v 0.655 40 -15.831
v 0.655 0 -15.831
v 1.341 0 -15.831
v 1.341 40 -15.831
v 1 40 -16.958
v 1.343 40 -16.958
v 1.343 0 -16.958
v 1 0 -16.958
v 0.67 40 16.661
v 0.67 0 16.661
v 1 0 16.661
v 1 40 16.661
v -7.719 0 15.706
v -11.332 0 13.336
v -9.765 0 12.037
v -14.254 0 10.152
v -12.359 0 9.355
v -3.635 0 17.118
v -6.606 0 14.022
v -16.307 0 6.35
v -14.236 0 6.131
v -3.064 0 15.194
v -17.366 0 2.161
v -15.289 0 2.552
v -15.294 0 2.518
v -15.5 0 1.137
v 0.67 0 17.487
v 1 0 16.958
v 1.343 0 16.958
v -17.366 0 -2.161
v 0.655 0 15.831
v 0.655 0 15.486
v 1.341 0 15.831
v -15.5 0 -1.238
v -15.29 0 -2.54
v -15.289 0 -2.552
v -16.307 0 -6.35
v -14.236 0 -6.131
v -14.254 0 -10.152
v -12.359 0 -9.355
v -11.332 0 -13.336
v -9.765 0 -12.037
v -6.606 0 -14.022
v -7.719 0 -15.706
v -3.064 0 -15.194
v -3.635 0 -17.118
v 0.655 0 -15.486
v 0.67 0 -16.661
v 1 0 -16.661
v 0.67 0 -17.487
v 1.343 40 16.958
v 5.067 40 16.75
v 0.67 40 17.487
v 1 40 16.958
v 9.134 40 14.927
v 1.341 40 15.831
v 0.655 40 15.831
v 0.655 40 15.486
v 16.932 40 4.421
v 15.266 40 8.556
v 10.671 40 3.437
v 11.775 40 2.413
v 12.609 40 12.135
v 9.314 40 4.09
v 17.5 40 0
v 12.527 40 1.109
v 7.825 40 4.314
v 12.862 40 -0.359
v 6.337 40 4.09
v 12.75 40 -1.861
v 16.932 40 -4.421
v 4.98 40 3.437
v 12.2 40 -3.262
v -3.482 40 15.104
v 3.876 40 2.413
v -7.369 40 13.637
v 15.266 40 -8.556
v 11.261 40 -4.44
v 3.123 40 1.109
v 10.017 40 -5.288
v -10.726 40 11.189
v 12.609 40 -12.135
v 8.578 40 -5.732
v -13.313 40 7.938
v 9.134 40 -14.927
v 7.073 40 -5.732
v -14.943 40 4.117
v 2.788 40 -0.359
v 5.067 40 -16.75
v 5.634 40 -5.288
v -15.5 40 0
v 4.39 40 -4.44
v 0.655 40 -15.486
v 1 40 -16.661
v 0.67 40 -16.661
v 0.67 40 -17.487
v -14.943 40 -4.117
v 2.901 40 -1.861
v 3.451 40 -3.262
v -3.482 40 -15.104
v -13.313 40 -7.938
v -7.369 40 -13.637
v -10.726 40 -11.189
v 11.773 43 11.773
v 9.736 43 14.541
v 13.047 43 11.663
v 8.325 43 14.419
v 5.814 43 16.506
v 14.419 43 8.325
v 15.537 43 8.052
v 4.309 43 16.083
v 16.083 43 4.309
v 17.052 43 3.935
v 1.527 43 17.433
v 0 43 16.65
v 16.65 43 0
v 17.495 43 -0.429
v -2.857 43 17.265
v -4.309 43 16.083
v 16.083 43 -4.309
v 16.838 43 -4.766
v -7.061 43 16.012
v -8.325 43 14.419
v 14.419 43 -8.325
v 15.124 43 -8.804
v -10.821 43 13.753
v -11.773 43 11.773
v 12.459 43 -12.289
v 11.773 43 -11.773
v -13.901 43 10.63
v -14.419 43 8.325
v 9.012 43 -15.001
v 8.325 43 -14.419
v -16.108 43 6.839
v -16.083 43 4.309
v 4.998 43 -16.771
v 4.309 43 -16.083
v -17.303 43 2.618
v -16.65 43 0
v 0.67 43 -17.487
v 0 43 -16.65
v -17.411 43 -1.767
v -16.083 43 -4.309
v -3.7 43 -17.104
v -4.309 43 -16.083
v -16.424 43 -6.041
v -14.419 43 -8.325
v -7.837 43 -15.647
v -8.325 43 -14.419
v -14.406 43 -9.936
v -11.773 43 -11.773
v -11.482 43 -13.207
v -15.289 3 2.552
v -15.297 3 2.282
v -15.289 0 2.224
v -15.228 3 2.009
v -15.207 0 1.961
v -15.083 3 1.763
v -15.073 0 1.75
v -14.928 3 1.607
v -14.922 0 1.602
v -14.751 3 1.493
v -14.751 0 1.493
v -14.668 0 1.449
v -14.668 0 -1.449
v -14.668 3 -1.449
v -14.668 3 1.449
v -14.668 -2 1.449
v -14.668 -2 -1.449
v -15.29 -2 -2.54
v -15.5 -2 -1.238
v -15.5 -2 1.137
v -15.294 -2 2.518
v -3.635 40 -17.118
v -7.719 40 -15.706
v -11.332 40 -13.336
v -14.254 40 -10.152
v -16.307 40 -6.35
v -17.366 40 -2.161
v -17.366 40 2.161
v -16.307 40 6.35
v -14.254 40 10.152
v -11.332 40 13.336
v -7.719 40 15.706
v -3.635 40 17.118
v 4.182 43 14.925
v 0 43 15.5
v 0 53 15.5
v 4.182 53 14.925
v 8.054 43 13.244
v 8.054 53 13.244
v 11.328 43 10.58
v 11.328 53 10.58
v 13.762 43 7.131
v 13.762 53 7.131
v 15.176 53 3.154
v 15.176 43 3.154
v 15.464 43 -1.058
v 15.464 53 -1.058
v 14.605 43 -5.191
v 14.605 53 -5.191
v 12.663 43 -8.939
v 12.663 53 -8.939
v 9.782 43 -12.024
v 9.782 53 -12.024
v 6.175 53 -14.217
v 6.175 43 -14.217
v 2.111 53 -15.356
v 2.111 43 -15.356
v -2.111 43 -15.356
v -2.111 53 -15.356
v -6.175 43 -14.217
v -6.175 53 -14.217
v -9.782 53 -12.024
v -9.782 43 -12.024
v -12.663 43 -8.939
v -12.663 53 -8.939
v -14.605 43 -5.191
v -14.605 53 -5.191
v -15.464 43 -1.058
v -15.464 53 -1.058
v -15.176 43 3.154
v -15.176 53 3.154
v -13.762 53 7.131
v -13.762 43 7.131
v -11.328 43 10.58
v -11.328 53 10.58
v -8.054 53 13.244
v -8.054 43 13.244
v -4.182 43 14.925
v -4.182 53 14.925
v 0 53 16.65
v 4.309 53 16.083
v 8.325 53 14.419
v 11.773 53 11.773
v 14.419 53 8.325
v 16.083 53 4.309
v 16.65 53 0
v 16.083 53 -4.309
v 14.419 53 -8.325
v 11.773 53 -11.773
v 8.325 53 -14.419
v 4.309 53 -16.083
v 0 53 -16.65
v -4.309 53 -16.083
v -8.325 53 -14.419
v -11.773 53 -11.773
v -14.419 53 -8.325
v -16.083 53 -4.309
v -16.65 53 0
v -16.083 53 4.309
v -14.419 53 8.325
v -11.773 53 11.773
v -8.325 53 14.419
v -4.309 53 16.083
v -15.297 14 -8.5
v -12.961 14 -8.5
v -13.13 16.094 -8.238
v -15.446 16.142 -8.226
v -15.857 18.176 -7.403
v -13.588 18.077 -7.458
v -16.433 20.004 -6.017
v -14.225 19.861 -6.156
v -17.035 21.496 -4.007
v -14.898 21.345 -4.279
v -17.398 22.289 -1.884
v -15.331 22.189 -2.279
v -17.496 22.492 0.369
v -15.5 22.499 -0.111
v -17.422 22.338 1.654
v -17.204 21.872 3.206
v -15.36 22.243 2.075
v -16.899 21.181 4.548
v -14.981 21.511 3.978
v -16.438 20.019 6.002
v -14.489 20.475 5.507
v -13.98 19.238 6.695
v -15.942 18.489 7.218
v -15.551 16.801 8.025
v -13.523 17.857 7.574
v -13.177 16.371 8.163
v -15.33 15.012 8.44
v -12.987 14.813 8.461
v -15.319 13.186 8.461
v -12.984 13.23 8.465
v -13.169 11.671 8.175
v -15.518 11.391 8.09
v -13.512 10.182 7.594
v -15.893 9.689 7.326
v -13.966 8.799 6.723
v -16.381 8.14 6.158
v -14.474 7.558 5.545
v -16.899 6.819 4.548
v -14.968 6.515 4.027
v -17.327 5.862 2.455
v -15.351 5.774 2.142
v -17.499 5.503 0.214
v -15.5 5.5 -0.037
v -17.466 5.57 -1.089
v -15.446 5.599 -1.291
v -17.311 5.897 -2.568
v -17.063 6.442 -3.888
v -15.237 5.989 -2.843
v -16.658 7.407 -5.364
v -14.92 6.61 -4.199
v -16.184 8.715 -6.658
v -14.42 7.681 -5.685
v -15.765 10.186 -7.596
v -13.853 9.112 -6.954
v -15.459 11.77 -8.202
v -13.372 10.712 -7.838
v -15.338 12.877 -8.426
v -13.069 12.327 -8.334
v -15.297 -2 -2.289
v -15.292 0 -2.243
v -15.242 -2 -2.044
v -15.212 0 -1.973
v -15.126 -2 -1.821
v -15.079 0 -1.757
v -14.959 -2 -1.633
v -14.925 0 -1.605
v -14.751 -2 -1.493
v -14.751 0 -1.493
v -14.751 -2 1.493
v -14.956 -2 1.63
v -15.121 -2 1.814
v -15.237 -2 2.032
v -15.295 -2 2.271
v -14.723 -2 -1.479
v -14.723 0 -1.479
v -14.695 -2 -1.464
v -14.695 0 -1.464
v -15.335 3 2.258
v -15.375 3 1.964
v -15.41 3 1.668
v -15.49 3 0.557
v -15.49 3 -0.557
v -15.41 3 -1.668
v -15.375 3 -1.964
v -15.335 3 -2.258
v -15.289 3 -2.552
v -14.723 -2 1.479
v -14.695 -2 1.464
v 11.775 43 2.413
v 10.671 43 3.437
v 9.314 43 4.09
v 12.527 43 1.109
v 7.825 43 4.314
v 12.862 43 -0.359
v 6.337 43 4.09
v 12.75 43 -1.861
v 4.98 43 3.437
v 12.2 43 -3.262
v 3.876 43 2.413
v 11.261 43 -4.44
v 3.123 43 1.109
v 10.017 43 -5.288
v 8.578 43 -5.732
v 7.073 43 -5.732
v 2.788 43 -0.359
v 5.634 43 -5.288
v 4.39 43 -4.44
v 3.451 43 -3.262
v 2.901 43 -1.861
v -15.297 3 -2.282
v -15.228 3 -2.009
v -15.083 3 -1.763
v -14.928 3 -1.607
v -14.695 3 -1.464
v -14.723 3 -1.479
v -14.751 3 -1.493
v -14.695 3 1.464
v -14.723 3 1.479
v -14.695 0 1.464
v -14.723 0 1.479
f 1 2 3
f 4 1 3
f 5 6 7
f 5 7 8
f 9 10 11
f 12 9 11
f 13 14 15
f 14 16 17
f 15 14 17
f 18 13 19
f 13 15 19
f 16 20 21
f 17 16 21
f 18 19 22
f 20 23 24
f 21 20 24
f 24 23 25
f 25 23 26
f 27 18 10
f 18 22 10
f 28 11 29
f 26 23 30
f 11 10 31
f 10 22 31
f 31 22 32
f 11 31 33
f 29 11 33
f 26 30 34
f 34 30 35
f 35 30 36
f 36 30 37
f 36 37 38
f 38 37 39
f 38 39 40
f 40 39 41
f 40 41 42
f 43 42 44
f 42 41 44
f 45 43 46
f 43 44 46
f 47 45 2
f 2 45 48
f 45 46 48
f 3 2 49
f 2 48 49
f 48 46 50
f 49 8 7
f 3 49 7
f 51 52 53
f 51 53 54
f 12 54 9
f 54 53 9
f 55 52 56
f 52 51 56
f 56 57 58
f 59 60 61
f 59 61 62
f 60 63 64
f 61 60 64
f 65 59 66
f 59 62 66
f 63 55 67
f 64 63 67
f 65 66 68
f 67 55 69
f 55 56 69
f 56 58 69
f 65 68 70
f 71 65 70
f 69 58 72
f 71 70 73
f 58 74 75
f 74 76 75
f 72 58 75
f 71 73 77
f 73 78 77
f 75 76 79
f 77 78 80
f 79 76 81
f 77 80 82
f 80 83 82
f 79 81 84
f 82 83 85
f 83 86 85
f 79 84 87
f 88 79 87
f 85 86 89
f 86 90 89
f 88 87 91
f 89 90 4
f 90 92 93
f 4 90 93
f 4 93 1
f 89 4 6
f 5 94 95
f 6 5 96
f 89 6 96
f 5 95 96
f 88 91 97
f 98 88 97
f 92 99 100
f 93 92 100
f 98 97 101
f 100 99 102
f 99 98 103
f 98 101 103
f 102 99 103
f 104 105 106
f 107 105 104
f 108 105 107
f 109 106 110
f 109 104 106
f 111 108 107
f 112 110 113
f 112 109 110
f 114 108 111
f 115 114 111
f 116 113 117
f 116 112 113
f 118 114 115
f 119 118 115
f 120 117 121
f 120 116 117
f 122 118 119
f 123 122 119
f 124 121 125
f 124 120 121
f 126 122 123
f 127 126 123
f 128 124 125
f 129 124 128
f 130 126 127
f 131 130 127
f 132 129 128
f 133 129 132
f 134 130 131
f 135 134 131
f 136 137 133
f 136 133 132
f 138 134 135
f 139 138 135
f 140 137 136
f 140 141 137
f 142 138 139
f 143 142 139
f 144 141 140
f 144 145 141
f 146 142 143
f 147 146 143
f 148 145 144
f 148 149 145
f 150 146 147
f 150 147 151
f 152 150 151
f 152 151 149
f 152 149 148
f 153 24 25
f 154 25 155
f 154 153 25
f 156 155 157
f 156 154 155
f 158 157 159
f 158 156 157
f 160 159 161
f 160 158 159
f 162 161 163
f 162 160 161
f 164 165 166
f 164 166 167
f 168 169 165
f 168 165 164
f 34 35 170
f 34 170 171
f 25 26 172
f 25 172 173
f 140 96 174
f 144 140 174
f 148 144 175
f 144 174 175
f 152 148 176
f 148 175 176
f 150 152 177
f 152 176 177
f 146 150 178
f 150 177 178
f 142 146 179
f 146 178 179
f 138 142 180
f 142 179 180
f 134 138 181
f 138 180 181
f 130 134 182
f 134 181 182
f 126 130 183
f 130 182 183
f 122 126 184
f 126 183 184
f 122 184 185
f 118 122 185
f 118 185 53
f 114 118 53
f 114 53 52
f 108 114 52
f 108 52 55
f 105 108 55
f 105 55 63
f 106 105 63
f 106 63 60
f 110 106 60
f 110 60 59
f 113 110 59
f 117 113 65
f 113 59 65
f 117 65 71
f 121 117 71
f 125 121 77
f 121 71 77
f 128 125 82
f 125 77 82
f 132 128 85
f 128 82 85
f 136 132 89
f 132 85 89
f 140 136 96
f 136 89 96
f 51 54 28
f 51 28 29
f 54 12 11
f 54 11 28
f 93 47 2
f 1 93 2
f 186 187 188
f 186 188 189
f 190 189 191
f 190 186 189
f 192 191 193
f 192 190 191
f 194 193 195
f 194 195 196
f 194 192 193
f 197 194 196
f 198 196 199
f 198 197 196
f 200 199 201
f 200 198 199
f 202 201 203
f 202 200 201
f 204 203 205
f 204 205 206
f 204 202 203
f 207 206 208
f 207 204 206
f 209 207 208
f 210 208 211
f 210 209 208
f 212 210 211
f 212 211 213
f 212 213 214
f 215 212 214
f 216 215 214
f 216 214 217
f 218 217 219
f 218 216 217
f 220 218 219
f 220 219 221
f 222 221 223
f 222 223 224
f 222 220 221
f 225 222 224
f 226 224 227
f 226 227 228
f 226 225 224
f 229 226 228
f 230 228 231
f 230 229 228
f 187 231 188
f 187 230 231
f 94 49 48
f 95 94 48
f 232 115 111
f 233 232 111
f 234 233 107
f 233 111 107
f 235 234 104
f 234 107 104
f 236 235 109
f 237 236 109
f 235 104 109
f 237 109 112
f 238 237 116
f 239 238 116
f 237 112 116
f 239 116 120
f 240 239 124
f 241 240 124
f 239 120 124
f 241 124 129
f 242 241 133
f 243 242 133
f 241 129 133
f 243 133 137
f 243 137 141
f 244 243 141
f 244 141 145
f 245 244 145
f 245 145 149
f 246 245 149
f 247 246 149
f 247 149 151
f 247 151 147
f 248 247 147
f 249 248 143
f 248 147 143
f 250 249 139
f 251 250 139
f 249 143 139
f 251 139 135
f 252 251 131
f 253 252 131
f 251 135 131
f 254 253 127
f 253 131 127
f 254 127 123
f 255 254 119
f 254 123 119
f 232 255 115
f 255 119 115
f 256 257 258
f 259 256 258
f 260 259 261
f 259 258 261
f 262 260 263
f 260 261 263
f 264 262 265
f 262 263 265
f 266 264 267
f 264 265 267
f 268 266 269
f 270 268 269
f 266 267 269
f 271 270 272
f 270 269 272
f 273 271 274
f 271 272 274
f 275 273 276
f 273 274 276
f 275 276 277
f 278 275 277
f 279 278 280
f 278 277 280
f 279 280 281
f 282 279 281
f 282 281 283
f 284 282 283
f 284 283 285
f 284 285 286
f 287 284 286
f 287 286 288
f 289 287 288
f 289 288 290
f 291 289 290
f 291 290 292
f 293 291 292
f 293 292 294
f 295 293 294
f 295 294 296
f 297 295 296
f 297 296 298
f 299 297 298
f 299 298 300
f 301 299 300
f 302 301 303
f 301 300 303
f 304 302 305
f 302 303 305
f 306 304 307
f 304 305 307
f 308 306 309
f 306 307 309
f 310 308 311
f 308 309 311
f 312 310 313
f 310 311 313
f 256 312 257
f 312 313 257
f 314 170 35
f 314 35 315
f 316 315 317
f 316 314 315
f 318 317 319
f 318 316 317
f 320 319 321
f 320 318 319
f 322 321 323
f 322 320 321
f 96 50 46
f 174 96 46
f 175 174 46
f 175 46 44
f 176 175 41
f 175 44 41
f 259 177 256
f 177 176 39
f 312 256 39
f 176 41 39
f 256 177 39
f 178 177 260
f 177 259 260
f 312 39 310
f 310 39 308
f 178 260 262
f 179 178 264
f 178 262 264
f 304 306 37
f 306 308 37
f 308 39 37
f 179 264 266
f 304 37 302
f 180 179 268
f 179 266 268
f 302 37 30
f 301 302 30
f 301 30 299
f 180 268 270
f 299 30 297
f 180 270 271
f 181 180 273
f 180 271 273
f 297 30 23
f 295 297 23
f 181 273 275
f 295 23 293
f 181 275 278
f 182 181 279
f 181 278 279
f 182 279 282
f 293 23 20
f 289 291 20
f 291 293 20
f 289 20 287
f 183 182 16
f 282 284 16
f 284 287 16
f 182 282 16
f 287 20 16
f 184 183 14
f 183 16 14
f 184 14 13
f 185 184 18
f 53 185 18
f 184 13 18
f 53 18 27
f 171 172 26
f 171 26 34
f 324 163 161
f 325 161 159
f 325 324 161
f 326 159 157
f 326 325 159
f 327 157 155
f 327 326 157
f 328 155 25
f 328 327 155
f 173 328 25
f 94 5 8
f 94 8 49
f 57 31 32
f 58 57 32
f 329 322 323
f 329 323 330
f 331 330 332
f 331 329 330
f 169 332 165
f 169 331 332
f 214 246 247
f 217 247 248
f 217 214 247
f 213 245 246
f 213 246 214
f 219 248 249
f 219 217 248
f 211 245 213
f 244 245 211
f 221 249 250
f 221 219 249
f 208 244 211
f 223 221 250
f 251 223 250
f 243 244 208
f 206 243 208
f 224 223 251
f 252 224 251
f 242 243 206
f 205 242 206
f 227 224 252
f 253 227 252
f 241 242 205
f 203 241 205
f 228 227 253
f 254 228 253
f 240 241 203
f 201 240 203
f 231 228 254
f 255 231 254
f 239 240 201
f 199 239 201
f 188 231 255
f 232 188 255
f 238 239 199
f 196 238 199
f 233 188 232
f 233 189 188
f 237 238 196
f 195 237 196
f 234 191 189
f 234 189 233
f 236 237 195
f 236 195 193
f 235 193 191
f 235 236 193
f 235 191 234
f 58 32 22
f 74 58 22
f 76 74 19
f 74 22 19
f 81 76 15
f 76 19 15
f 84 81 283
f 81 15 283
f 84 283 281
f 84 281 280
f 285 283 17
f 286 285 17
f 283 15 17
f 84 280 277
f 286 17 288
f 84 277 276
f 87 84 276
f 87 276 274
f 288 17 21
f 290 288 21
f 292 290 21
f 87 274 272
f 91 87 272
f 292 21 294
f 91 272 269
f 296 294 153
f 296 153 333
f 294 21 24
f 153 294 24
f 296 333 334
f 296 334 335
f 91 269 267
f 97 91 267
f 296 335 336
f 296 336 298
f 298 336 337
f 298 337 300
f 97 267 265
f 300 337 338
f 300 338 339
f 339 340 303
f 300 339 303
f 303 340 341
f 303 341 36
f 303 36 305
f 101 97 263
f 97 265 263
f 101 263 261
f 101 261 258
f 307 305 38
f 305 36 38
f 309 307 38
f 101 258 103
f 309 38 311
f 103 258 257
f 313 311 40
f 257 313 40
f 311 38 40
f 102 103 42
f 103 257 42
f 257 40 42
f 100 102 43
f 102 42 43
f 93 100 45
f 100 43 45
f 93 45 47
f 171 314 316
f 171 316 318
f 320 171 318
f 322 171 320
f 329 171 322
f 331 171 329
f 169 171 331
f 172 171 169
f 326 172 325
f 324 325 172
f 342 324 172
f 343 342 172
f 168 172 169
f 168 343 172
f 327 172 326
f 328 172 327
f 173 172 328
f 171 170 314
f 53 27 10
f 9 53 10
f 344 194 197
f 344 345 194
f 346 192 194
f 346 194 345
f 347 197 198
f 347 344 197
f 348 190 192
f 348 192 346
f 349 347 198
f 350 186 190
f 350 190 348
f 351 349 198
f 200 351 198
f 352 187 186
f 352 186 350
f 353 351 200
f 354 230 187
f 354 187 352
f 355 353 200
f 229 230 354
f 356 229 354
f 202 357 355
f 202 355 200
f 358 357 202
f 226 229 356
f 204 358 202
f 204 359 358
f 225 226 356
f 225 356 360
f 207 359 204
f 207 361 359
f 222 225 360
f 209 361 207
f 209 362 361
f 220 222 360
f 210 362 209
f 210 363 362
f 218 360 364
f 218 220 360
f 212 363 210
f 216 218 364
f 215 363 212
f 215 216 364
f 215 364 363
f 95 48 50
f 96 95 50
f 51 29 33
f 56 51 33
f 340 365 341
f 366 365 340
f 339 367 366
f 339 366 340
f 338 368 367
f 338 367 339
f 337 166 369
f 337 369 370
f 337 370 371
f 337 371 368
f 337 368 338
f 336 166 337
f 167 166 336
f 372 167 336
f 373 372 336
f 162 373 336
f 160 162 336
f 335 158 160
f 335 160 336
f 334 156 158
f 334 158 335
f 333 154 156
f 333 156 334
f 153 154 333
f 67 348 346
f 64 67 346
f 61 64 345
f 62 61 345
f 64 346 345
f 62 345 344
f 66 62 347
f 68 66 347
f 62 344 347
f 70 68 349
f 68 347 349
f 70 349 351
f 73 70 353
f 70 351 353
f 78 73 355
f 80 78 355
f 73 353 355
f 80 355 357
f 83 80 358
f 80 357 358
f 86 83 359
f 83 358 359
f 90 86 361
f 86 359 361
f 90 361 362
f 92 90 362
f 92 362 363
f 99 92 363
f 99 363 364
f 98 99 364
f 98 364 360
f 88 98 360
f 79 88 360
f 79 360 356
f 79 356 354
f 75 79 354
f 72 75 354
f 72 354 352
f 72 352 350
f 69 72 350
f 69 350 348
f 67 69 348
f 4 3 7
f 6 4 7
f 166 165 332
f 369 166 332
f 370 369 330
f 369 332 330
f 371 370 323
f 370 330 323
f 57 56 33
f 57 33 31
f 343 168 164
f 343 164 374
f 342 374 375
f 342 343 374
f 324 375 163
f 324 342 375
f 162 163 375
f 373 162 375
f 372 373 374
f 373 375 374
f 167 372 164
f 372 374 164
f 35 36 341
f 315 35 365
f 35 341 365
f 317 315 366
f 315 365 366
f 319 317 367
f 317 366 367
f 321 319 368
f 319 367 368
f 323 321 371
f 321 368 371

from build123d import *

# Parameters (mm, degrees)
BOSS_EXTRUDE1_DEPTH = 40
SKETCH16_R          = 17.5
BOSS_EXTRUDE2_DEPTH = 3
SKETCH17_R          = 16.65
SKETCH17_R_2        = 15.5
BOSS_EXTRUDE3_DEPTH = 10
SKETCH18_R          = 8.5
CUT_EXTRUDE1_DEPTH  = 30
BOSS_EXTRUDE4_DEPTH = 3
FILLET1_R           = 1
FILLET3_R           = 1
BOSS_EXTRUDE5_START = 2
BOSS_EXTRUDE5_DEPTH = 2
CUT_EXTRUDE3_START  = -2
CUT_EXTRUDE3_DEPTH  = 2
SKETCH28_R          = 5.051145337
CUT_EXTRUDE4_DEPTH  = 10


# Read off the part's stored shape, not the designer's step: Cut-Extrude3
with BuildPart() as part:
    # Sketch13 → Boss-Extrude1 (new body)
    with BuildSketch(Plane(origin=(0, 0, 0), x_dir=(1, 0, 0), z_dir=(0, 1, 0))):
        with BuildLine():
            Line((0.65523527, 15.486144347), (0.65523527, 15.830625123))
            Line((0.65523527, 15.830625123), (1.340586782, 15.830625123))
            Line((1.340586782, 15.830625123), (1.342992881, 16.95829018))
            Line((1.342992881, 16.95829018), (0.999793375, 16.95829018))
            Line((0.999793375, 16.95829018), (0.999793375, 16.661380915))
            Line((0.999793375, 16.661380915), (0.670404475, 16.661380915))
            Line((0.670404475, 16.661380915), (0.670404475, 17.487154081))
            ThreePointArc((0.670404475, 17.487154081), (-17.5, 0), (0.670404475, -17.487154081))
            Line((0.670404475, -17.487154081), (0.670404475, -16.661380915))
            Line((0.670404475, -16.661380915), (0.999793375, -16.661380915))
            Line((0.999793375, -16.661380915), (0.999793375, -16.95829018))
            Line((0.999793375, -16.95829018), (1.342992881, -16.95829018))
            Line((1.342992881, -16.95829018), (1.340586782, -15.830625123))
            Line((1.340586782, -15.830625123), (0.65523527, -15.830625123))
            Line((0.65523527, -15.830625123), (0.65523527, -15.486144347))
            ThreePointArc((0.65523527, -15.486144347), (-15.5, 0), (0.65523527, 15.486144347))
        make_face()
    extrude(amount=BOSS_EXTRUDE1_DEPTH)

    # Sketch16 → Boss-Extrude2 (add)
    with BuildSketch(Plane(origin=(0, 40, 0), x_dir=(1, 0, 0), z_dir=(0, 1, 0))):
        with Locations(Location((0, 0, 0), (0, 0, 87.804528663))):
            Circle(SKETCH16_R)
    extrude(amount=BOSS_EXTRUDE2_DEPTH)

    # Sketch17 → Boss-Extrude3 (add)
    with BuildSketch(Plane(origin=(0, 43, 0), x_dir=(1, 0, 0), z_dir=(0, 1, 0))):
        with Locations(Location((0, 0, 0), (0, 0, 270))):
            Circle(SKETCH17_R)
        with Locations(Location((0, 0, 0), (0, 0, 270))):
            Circle(SKETCH17_R_2, mode=Mode.SUBTRACT)
    extrude(amount=BOSS_EXTRUDE3_DEPTH)

    # Sketch18 → Cut-Extrude1 (cut)
    with BuildSketch(Plane(origin=(0, 0, 0), x_dir=(0, 0, -1), z_dir=(1, 0, 0))):
        with Locations((0, 14)):
            Circle(SKETCH18_R)
    extrude(amount=-CUT_EXTRUDE1_DEPTH, mode=Mode.SUBTRACT)

    # Sketch20 → Boss-Extrude4 (add)
    with BuildSketch(Plane.XZ):
        with BuildLine():
            Line((-14.667785333, 1.448781774), (-14.667785333, -1.448781774))
            ThreePointArc((-14.667785333, -1.448781774), (-15.025977642, -1.602140032), (-15.409950004, -1.668364732))
            ThreePointArc((-15.409950004, -1.668364732), (-15.5, 0), (-15.409950004, 1.668364732))
            ThreePointArc((-15.409950004, 1.668364732), (-15.025977642, 1.602140032), (-14.667785333, 1.448781774))
        make_face()
    extrude(amount=-BOSS_EXTRUDE4_DEPTH)

    # Fillet1
    fillet1_edges = [part.edges().sort_by_distance(p)[0] for p in [
        (-15.409950004, 1.5, 1.668364732),
    ]]
    fillet(fillet1_edges, radius=FILLET1_R)

    # Fillet3
    fillet3_edges = [part.edges().sort_by_distance(p)[0] for p in [
        (-15.409950004, 1.5, -1.668364732),
    ]]
    fillet(fillet3_edges, radius=FILLET3_R)

    # Sketch25 → Boss-Extrude5 (add)
    with BuildSketch(Plane.XZ.offset(BOSS_EXTRUDE5_START)):
        with BuildLine():
            Line((-15.5, 2.560490416), (-15.5, -2.560490416))
            ThreePointArc((-15.5, -2.560490416), (-15.394165826, -2.55830223), (-15.288512543, -2.551741411))
            ThreePointArc((-15.288512543, -2.551741411), (-15.193650033, -1.934078734), (-14.750654034, -1.493328665))
            ThreePointArc((-14.750654034, -1.493328665), (-14.708906064, -1.471638632), (-14.667785333, -1.448781774))
            Line((-14.667785333, -1.448781774), (-14.667785333, 1.448781774))
            ThreePointArc((-14.667785333, 1.448781774), (-14.708906064, 1.471638632), (-14.750654034, 1.493328665))
            ThreePointArc((-14.750654034, 1.493328665), (-15.193650033, 1.934078734), (-15.288512543, 2.551741411))
            ThreePointArc((-15.288512543, 2.551741411), (-15.394165826, 2.55830223), (-15.5, 2.560490416))
        make_face()
    extrude(amount=-BOSS_EXTRUDE5_DEPTH)

    # Cut-Extrude3 outline → Cut-Extrude3 (cut)
    with BuildSketch(Plane.XZ.offset(2).offset(CUT_EXTRUDE3_START)):
        with BuildLine():
            ThreePointArc((-15.288512543, -2.551741411), (-15.28944127, -2.546076966), (-15.290337467, -2.540407283))
            Line((-15.290337467, -2.540407283), (-15.5, -1.238247673))
            Line((-15.5, -1.238247673), (-15.5, -2.560490416))
            ThreePointArc((-15.5, -2.560490416), (-15.394165826, -2.55830223), (-15.288512543, -2.551741411))
        make_face()
        with BuildLine():
            Line((-15.5, 2.560490416), (-15.5, 1.136515472))
            Line((-15.5, 1.136515472), (-15.293549726, 2.518033727))
            ThreePointArc((-15.293549726, 2.518033727), (-15.291174748, 2.53490903), (-15.288512543, 2.551741411))
            ThreePointArc((-15.288512543, 2.551741411), (-15.394165826, 2.55830223), (-15.5, 2.560490416))
        make_face()
    extrude(amount=CUT_EXTRUDE3_DEPTH, mode=Mode.SUBTRACT)

    # Sketch28 → Cut-Extrude4 (cut)
    with BuildSketch(Plane(origin=(0, 43, 0), x_dir=(1, 0, 0), z_dir=(0, 1, 0))):
        with Locations(Location((7.825464684, 0.736813233, 0), (0, 0, 270))):
            Circle(SKETCH28_R)
    extrude(amount=-CUT_EXTRUDE4_DEPTH, mode=Mode.SUBTRACT)


solid = part.part
